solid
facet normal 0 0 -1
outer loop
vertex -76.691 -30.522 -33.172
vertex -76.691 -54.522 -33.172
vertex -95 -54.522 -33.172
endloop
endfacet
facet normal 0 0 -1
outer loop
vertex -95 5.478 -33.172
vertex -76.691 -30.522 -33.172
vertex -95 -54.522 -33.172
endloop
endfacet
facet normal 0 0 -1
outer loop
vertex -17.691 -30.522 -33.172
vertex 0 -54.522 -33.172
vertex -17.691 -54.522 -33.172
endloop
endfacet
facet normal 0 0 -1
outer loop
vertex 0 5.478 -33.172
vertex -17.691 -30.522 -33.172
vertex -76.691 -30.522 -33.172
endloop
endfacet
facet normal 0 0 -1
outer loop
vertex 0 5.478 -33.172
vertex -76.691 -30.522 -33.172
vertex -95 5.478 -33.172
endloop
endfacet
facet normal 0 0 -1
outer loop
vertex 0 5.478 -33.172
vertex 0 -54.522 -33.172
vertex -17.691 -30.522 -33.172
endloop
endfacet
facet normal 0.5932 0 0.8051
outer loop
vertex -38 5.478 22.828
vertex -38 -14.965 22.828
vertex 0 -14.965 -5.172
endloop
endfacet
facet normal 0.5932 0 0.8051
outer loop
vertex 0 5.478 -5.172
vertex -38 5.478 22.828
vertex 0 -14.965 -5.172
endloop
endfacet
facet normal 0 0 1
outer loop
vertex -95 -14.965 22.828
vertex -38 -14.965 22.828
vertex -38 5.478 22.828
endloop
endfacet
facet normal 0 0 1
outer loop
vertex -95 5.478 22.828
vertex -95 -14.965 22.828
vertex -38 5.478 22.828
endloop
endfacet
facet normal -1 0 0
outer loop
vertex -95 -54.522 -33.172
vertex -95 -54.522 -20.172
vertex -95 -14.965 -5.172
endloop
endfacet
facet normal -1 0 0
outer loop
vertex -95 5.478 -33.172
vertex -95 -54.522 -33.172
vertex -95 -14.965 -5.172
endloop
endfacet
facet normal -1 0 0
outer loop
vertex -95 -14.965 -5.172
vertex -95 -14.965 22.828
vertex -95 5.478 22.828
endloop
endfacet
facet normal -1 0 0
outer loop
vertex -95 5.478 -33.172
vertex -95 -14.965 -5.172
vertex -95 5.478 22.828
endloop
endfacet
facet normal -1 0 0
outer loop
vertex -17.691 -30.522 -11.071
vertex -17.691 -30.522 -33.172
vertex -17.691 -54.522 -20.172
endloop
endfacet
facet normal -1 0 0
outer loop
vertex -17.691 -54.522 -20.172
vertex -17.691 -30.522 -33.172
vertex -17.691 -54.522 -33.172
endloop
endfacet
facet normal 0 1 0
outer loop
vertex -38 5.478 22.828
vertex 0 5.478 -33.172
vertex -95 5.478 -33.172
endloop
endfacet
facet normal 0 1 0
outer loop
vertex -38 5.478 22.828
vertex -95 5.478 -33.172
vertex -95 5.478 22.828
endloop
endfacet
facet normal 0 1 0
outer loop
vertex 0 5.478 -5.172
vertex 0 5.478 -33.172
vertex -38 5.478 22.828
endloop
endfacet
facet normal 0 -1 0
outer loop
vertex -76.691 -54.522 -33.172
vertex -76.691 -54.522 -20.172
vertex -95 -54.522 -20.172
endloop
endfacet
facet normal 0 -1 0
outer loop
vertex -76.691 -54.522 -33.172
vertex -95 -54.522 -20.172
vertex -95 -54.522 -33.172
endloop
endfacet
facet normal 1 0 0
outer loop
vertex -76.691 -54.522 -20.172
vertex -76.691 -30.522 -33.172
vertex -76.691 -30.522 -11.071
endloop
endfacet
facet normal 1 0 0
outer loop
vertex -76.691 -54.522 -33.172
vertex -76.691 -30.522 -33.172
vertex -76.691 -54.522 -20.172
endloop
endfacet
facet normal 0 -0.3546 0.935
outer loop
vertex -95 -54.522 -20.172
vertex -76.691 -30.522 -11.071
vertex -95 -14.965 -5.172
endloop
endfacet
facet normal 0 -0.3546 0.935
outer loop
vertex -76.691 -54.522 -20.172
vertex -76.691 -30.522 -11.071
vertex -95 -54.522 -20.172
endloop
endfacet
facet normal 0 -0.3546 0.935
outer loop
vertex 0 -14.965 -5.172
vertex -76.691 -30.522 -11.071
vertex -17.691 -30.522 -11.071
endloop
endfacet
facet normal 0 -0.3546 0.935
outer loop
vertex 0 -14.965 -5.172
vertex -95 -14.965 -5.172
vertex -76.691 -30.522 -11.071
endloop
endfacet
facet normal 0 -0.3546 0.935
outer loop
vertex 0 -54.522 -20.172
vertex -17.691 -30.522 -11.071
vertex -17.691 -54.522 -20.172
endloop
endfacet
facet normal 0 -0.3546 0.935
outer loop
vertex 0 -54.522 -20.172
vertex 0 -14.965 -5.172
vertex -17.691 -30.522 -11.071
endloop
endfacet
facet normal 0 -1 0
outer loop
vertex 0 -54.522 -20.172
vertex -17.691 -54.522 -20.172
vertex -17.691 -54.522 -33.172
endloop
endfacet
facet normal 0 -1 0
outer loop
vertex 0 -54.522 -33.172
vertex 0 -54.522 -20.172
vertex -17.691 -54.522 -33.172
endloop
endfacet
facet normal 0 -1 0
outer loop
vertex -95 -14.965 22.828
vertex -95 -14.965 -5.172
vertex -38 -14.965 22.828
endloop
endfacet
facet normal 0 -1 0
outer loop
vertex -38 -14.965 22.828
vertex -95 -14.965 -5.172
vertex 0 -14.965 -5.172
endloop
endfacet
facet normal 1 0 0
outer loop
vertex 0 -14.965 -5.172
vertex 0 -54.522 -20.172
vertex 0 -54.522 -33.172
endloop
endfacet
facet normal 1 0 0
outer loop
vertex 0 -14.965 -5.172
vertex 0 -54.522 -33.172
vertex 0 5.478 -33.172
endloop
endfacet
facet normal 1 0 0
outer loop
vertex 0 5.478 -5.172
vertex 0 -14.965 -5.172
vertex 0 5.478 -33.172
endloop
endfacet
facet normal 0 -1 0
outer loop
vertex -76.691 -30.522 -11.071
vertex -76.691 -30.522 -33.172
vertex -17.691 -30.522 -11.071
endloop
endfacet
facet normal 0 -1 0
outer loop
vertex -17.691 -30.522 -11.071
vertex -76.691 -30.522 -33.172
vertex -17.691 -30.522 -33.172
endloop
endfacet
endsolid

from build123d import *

# Parameters (mm, degrees)
F0_W     = 20.443046
F0_H     = 28
F1_DEPTH = 95
F3_DEPTH = 25
F4_W     = 59
F4_H     = 24
F5_DEPTH = 25


with BuildPart() as f1:
    # F0 (on Right) → F1 (new body)
    with BuildSketch(Plane.YZ):
        with Locations((-4.743823, 8.828466)):
            Rectangle(F0_W, F0_H)
        Polygon((-54.5223, -20.171534), (-54.5223, -33.171534), (5.4777, -33.171534), (5.4777, -5.171534), (-14.965346, -5.171534), align=None)
    extrude(amount=-F1_DEPTH)

    # F2 (on face) → F3 (cut)
    with BuildSketch(Plane.XZ.offset(14.965346)):
        Polygon((0, 22.828466), (-38, 22.828466), (0, -5.171534), align=None)
    extrude(amount=-F3_DEPTH, mode=Mode.SUBTRACT)

    # F4 (on face) → F5 (cut)
    with BuildSketch(Plane(origin=(0, 0, -33.171534), x_dir=(1, 0, 0), z_dir=(0, 0, -1))):
        with Locations((-47.190733, 42.5223)):
            Rectangle(F4_W, F4_H)
    extrude(amount=-F5_DEPTH, mode=Mode.SUBTRACT)


solid = f1.part
